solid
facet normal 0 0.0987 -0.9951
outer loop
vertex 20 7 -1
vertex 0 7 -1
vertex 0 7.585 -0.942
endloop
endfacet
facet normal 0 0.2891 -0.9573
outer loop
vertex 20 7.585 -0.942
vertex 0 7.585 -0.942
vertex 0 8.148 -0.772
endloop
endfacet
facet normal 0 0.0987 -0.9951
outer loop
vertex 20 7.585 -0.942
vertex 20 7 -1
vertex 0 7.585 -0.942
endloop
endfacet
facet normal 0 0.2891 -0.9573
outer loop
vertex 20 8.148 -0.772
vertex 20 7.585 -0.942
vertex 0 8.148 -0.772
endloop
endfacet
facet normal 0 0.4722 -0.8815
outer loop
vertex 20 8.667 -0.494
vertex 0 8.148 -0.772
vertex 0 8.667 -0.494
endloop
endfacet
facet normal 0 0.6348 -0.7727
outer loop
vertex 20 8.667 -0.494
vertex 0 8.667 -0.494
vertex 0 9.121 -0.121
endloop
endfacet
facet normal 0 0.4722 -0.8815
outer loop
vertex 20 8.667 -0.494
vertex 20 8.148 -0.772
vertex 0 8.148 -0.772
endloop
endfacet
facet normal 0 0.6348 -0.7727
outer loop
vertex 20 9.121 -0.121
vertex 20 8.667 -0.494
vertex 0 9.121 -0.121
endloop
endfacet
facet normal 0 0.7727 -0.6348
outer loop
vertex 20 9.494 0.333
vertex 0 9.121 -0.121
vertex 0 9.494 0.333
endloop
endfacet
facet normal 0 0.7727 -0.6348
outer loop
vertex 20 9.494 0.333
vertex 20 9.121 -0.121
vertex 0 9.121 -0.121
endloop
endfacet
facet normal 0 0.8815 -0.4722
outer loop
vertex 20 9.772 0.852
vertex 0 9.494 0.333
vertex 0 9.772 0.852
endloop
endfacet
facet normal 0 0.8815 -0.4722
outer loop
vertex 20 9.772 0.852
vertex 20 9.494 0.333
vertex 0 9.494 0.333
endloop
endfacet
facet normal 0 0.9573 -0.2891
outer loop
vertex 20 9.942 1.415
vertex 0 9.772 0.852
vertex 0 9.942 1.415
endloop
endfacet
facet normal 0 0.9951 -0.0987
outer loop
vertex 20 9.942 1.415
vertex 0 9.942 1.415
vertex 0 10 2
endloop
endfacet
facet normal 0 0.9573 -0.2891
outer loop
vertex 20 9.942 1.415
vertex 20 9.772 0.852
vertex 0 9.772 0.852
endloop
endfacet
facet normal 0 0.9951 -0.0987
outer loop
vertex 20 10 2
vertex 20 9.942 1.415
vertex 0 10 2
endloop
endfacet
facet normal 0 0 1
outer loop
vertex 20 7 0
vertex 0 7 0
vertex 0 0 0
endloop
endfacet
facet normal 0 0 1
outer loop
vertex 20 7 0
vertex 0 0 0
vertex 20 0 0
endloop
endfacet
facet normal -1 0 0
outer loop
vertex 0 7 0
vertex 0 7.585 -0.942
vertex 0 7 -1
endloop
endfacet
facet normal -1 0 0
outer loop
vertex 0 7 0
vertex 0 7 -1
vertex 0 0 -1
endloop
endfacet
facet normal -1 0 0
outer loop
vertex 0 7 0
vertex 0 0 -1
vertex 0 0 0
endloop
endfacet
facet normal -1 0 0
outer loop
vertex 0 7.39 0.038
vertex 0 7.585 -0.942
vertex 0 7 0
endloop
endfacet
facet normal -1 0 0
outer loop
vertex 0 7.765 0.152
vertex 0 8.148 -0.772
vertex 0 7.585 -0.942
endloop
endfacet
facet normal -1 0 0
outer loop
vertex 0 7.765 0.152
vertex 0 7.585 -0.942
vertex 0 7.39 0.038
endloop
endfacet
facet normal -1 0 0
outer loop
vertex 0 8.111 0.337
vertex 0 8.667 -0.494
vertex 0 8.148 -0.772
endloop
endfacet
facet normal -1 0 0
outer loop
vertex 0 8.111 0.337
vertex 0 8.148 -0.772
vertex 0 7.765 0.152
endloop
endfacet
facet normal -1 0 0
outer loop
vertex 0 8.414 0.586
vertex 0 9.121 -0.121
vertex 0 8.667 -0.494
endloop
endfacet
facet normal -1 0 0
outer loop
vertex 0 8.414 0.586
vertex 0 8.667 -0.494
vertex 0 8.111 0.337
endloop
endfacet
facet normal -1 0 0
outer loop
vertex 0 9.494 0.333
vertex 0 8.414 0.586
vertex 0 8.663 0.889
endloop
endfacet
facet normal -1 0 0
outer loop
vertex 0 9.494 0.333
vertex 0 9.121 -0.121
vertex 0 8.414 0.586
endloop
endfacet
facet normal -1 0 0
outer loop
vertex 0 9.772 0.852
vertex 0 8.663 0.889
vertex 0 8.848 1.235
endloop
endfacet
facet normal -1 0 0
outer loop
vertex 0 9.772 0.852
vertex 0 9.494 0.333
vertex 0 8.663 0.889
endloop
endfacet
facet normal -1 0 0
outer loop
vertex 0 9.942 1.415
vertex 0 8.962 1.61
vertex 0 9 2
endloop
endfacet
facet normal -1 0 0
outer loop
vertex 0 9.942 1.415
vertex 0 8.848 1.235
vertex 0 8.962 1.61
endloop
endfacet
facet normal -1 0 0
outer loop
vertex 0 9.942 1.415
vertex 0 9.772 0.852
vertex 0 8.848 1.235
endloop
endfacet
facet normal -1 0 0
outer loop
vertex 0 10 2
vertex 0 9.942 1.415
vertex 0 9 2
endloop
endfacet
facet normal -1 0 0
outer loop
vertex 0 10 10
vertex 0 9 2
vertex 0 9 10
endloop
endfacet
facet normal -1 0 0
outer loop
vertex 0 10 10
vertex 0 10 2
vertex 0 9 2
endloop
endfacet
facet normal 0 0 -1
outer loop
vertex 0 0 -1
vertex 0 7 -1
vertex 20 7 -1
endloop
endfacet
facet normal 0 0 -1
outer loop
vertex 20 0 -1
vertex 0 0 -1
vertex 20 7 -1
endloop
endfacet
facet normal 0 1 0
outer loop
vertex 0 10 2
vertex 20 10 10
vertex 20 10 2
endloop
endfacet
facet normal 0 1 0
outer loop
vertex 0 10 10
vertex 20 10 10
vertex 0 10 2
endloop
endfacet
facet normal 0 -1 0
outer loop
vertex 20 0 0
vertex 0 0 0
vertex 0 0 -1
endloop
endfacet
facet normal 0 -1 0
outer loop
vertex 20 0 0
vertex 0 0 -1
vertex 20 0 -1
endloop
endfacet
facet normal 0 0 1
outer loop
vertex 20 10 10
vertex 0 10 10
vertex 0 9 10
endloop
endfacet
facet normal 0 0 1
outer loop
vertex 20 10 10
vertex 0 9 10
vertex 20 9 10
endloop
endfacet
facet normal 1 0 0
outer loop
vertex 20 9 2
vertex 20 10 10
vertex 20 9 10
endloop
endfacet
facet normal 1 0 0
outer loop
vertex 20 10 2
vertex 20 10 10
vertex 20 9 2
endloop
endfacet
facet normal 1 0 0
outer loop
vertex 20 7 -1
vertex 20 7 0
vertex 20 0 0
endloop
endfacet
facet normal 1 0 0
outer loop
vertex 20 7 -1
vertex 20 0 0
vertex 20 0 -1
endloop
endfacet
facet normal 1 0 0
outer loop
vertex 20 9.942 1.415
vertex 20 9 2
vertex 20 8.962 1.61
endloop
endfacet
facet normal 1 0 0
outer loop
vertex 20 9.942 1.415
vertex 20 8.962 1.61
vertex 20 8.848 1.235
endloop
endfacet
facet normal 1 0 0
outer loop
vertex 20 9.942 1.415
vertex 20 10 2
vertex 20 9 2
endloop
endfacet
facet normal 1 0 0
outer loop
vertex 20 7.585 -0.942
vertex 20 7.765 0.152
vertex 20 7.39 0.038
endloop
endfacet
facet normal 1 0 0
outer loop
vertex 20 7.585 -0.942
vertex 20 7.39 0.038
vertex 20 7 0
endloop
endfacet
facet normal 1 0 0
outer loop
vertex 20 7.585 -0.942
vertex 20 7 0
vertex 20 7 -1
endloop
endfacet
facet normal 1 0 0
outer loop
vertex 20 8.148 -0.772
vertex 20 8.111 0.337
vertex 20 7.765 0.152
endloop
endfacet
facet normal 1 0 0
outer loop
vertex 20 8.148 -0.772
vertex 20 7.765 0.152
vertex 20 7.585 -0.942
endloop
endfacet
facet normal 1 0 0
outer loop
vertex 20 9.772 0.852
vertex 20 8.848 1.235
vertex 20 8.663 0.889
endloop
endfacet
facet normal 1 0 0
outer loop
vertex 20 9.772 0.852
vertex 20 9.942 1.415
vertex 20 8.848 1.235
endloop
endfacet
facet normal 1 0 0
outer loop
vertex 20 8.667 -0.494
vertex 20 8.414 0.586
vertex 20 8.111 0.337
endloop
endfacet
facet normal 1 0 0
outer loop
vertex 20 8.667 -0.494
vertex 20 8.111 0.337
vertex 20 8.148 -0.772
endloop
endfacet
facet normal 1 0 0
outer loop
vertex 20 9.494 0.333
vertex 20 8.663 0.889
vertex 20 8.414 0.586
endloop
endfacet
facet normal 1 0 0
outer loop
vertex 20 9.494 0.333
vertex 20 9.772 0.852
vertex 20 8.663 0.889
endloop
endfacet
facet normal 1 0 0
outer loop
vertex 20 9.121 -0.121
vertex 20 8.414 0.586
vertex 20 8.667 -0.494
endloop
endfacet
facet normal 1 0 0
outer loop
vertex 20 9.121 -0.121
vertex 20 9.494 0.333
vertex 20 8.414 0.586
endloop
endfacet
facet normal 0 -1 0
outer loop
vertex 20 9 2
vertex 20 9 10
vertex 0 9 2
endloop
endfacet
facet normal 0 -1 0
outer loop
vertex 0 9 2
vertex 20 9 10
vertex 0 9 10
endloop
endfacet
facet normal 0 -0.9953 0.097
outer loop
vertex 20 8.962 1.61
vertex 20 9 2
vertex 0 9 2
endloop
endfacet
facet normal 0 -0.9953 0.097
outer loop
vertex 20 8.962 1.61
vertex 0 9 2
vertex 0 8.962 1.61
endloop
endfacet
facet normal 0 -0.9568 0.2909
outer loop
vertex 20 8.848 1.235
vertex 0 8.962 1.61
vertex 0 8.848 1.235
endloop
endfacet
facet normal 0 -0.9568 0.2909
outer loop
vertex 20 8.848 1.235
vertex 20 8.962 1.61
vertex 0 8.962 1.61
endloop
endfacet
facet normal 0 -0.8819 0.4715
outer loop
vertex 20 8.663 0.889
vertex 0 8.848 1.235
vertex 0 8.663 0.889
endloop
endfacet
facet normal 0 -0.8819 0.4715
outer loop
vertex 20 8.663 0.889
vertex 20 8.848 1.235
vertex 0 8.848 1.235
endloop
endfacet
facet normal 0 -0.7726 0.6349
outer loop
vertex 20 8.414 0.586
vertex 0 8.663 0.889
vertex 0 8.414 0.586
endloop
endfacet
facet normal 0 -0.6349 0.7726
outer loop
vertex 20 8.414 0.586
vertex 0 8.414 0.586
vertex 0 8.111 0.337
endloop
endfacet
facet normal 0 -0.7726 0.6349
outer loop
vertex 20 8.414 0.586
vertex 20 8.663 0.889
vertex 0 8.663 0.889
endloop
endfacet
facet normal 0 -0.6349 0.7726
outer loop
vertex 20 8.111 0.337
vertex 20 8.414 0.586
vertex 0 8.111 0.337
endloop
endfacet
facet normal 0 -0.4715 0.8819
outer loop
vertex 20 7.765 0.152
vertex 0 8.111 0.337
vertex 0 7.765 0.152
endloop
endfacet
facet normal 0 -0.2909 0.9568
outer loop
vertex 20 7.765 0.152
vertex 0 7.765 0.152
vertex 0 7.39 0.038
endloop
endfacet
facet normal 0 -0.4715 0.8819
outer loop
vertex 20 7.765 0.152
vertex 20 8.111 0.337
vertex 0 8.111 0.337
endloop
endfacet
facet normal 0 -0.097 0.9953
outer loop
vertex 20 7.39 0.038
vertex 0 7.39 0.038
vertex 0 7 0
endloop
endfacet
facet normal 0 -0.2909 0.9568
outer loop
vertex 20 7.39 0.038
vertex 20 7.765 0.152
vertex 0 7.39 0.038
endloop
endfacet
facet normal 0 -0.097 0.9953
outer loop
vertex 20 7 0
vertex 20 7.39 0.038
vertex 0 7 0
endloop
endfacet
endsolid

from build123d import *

# Parameters (mm, degrees)
SKETCH_1_W                 = 20
SKETCH_1_H                 = 10
BASEPLATE_DEPTH            = 1
EDGEFLANGE_STRIP_W         = 8
EDGEFLANGE_STRIP_H         = 1
EDGEFLANGE_STRIP_CUT_DEPTH = 20
EDGEFLANGE_DEPTH           = 20
EDGEFLANGE_FLAT_DEPTH      = 1


# Sheet-metal steps are written as plain solids
with BuildPart() as part:
    # Sketch 1 → BasePlate (new body)
    with BuildSketch(Plane.XY):
        with Locations((10, 5)):
            Rectangle(SKETCH_1_W, SKETCH_1_H)
    extrude(amount=-BASEPLATE_DEPTH)

    # EdgeFlange strip (across the edge) → EdgeFlange strip cut (cut)
    with BuildSketch(Plane(origin=(20, 10, 0), x_dir=(0, -1, 0), z_dir=(-1, 0, 0))):
        with Locations((-1, -0.5)):
            Rectangle(EDGEFLANGE_STRIP_W, EDGEFLANGE_STRIP_H)
    extrude(amount=EDGEFLANGE_STRIP_CUT_DEPTH, mode=Mode.SUBTRACT)

    # EdgeFlange bend section (across the edge) → EdgeFlange (add)
    with BuildSketch(Plane(origin=(20, 10, 0), x_dir=(0, -1, 0), z_dir=(-1, 0, 0))):
        with BuildLine():
            Line((0, 2), (1, 2))
            ThreePointArc((1, 2), (1.585786438, 0.585786438), (3, 0))
            Line((3, 0), (3, -1))
            ThreePointArc((3, -1), (0.878679656, -0.121320344), (0, 2))
        make_face()
    extrude(amount=EDGEFLANGE_DEPTH)

    # EdgeFlange profile (on flange) → EdgeFlange flat (add)
    with BuildSketch(Plane(origin=(0, 10, 0), x_dir=(-1, 0, 0), z_dir=(0, 1, 0))):
        Polygon((-20, 10), (-20, 2), (0, 2), (0, 10), (-2, 10), (-18, 10), align=None)
    extrude(amount=-EDGEFLANGE_FLAT_DEPTH)


solid = part.part
